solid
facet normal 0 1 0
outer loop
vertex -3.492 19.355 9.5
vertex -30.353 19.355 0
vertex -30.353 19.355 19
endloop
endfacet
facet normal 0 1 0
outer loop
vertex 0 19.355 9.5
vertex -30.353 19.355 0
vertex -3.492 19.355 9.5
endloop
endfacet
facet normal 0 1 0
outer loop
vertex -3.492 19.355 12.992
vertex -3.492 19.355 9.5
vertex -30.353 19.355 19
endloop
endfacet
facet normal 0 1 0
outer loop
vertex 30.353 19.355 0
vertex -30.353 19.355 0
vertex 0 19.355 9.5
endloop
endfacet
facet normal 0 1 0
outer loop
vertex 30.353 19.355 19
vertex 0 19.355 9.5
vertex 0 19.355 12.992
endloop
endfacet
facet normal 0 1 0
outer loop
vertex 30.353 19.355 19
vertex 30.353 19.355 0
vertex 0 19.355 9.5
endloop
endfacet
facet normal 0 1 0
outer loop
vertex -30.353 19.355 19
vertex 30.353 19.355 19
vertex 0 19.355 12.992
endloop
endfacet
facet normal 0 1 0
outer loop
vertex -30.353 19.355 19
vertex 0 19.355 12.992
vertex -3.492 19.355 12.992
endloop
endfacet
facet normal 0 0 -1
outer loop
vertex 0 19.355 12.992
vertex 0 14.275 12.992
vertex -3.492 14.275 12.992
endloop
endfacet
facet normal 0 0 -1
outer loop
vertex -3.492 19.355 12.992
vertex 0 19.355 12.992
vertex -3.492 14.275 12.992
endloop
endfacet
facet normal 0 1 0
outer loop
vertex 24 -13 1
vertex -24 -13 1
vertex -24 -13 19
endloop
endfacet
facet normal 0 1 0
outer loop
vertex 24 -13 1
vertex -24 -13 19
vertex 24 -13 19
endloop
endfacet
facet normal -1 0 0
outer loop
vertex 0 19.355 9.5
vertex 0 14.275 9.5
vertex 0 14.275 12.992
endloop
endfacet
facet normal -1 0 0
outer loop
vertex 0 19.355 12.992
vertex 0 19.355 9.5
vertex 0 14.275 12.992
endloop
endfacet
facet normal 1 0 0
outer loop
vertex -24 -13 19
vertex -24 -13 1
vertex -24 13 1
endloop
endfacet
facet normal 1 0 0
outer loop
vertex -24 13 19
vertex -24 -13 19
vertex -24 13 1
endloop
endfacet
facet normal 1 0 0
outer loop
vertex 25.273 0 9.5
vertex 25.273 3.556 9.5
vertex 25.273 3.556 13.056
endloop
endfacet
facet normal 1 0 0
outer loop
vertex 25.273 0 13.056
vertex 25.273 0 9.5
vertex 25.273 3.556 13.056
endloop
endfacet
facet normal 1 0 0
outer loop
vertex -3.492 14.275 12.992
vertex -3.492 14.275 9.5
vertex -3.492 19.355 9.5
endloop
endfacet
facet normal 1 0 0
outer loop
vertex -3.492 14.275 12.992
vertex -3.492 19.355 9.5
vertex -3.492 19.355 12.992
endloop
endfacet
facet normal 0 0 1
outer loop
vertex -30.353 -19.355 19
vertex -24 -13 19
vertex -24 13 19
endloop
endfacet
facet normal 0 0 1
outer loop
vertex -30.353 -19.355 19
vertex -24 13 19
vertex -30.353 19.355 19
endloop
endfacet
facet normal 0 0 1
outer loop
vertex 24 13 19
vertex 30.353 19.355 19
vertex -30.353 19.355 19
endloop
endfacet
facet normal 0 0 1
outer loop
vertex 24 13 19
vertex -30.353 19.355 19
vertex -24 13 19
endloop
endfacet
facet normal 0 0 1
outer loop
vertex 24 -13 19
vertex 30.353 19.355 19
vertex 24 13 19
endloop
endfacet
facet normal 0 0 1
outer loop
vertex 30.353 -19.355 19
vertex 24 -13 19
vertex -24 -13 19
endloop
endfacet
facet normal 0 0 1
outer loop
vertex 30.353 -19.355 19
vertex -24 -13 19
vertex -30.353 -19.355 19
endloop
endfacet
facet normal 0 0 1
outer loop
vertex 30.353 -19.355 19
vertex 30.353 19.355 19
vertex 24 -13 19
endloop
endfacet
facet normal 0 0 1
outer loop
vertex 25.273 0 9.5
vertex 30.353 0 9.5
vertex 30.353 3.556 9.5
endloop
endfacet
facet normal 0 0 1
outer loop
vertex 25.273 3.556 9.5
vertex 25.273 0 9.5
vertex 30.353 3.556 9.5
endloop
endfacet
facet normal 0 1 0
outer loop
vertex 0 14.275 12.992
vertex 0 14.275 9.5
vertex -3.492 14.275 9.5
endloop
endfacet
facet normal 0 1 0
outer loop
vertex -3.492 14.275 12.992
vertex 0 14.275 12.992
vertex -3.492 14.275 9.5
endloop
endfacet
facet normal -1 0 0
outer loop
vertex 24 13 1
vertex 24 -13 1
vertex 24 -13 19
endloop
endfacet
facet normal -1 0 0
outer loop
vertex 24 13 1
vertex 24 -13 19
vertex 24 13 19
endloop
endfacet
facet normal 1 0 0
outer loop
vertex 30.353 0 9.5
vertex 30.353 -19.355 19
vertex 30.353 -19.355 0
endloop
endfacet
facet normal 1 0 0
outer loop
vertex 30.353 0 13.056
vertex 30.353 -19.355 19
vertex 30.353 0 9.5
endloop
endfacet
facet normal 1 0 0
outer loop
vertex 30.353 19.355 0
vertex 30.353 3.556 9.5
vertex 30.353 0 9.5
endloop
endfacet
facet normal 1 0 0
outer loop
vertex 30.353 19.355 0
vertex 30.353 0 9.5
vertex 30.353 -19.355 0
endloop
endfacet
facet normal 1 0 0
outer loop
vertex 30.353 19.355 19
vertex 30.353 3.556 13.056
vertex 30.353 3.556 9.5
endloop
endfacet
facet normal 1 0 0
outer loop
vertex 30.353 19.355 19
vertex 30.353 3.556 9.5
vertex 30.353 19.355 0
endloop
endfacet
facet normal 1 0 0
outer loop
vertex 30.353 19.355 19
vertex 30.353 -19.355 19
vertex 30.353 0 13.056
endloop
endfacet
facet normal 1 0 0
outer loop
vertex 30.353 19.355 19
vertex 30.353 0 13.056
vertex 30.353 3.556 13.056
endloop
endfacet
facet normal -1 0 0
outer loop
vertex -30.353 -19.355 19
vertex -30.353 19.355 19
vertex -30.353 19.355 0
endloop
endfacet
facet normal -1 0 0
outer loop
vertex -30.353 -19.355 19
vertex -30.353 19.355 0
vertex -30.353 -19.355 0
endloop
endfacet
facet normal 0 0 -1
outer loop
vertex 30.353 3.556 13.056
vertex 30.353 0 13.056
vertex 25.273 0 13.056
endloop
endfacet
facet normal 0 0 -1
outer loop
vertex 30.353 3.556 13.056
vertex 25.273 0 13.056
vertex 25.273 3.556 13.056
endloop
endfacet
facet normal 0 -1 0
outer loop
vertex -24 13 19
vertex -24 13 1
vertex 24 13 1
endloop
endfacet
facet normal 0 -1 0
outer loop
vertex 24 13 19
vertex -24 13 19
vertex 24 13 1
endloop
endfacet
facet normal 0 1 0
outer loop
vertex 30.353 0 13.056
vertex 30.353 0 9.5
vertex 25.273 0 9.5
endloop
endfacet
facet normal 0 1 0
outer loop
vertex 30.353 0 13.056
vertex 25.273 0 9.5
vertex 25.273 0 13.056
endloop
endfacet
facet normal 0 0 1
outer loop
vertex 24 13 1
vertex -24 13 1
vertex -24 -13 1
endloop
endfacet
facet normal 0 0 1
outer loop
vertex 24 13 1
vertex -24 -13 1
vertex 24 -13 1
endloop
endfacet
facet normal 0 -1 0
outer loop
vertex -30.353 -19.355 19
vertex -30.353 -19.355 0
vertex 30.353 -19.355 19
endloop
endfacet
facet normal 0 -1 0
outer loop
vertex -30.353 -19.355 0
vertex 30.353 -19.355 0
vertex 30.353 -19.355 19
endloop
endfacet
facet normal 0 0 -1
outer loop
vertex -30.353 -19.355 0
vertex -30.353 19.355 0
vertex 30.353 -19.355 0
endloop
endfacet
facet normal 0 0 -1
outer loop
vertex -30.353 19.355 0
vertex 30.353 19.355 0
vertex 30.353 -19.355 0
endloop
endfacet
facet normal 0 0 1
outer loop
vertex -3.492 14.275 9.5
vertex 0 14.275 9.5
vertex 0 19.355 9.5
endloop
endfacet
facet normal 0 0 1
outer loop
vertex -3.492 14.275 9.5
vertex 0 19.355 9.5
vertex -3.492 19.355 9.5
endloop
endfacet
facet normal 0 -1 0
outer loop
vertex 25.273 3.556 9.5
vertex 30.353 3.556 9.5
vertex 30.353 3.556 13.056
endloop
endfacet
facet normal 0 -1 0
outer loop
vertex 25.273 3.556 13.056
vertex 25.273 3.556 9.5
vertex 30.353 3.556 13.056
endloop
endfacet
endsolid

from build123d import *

# Parameters (mm, degrees)
F0_W      = 48
F0_H      = 26
F1_DEPTH  = 1
F0_H_2    = 1.2748
F0_W_2    = 1.273
F2_DEPTH  = 19
F4_W      = 50.546
F4_H      = 19
F4_W_2    = 3.4925
F4_H_2    = 3.4925
F5_DEPTH  = 5.08
F3_W      = 50.546
F3_H      = 19
F6_DEPTH  = 5.08
F7_W      = 38.7096
F7_H      = 19
F7_W_2    = 3.556
F7_H_2    = 3.556
F9_DEPTH  = 5.08
F8_W      = 38.7096
F8_H      = 19
F10_DEPTH = 5.08


with BuildPart() as f1:
    # F0 (on Top) → F1 (new body)
    with BuildSketch(Plane.XY):
        Rectangle(F0_W, F0_H)
    extrude(amount=F1_DEPTH)

    # F0 (on Top) → F2 (join)
    with BuildSketch(Plane.XY):
        with Locations((0, -13.6374)):
            Rectangle(F0_W, F0_H_2)
        with Locations((0, 13.6374)):
            Rectangle(F0_W, F0_H_2)
        with Locations((24.6365, 0)):
            Rectangle(F0_W_2, F0_H)
        with Locations((-24.6365, 0)):
            Rectangle(F0_W_2, F0_H)
        with Locations((-24.6365, -13.6374)):
            Rectangle(F0_W_2, F0_H_2)
        with Locations((24.6365, -13.6374)):
            Rectangle(F0_W_2, F0_H_2)
        with Locations((24.6365, 13.6374)):
            Rectangle(F0_W_2, F0_H_2)
        with Locations((-24.6365, 13.6374)):
            Rectangle(F0_W_2, F0_H_2)
    extrude(amount=F2_DEPTH)

    # F4 (on face) → F5 (join)
    with BuildSketch(Plane(origin=(0, 14.2748, 0), x_dir=(-1, 0, 0), z_dir=(0, 1, 0))):
        with Locations((0, 9.5)):
            Rectangle(F4_W, F4_H)
        with Locations((1.74625, 11.24625)):
            Rectangle(F4_W_2, F4_H_2, mode=Mode.SUBTRACT)
    extrude(amount=F5_DEPTH)

    # F3 (on face) → F6 (join)
    with BuildSketch(Plane.XZ.offset(14.2748)):
        with Locations((0, 9.5)):
            Rectangle(F3_W, F3_H)
    extrude(amount=F6_DEPTH)

    # F7 (on face) → F9 (join)
    with BuildSketch(Plane.YZ.offset(25.273)):
        with Locations((0, 9.5)):
            Rectangle(F7_W, F7_H)
        with Locations((1.778, 11.278)):
            Rectangle(F7_W_2, F7_H_2, mode=Mode.SUBTRACT)
    extrude(amount=F9_DEPTH)

    # F8 (on face) → F10 (join)
    with BuildSketch(Plane(origin=(-25.273, 0, 0), x_dir=(0, -1, 0), z_dir=(-1, 0, 0))):
        with Locations((0, 9.5)):
            Rectangle(F8_W, F8_H)
    extrude(amount=F10_DEPTH)


solid = f1.part
